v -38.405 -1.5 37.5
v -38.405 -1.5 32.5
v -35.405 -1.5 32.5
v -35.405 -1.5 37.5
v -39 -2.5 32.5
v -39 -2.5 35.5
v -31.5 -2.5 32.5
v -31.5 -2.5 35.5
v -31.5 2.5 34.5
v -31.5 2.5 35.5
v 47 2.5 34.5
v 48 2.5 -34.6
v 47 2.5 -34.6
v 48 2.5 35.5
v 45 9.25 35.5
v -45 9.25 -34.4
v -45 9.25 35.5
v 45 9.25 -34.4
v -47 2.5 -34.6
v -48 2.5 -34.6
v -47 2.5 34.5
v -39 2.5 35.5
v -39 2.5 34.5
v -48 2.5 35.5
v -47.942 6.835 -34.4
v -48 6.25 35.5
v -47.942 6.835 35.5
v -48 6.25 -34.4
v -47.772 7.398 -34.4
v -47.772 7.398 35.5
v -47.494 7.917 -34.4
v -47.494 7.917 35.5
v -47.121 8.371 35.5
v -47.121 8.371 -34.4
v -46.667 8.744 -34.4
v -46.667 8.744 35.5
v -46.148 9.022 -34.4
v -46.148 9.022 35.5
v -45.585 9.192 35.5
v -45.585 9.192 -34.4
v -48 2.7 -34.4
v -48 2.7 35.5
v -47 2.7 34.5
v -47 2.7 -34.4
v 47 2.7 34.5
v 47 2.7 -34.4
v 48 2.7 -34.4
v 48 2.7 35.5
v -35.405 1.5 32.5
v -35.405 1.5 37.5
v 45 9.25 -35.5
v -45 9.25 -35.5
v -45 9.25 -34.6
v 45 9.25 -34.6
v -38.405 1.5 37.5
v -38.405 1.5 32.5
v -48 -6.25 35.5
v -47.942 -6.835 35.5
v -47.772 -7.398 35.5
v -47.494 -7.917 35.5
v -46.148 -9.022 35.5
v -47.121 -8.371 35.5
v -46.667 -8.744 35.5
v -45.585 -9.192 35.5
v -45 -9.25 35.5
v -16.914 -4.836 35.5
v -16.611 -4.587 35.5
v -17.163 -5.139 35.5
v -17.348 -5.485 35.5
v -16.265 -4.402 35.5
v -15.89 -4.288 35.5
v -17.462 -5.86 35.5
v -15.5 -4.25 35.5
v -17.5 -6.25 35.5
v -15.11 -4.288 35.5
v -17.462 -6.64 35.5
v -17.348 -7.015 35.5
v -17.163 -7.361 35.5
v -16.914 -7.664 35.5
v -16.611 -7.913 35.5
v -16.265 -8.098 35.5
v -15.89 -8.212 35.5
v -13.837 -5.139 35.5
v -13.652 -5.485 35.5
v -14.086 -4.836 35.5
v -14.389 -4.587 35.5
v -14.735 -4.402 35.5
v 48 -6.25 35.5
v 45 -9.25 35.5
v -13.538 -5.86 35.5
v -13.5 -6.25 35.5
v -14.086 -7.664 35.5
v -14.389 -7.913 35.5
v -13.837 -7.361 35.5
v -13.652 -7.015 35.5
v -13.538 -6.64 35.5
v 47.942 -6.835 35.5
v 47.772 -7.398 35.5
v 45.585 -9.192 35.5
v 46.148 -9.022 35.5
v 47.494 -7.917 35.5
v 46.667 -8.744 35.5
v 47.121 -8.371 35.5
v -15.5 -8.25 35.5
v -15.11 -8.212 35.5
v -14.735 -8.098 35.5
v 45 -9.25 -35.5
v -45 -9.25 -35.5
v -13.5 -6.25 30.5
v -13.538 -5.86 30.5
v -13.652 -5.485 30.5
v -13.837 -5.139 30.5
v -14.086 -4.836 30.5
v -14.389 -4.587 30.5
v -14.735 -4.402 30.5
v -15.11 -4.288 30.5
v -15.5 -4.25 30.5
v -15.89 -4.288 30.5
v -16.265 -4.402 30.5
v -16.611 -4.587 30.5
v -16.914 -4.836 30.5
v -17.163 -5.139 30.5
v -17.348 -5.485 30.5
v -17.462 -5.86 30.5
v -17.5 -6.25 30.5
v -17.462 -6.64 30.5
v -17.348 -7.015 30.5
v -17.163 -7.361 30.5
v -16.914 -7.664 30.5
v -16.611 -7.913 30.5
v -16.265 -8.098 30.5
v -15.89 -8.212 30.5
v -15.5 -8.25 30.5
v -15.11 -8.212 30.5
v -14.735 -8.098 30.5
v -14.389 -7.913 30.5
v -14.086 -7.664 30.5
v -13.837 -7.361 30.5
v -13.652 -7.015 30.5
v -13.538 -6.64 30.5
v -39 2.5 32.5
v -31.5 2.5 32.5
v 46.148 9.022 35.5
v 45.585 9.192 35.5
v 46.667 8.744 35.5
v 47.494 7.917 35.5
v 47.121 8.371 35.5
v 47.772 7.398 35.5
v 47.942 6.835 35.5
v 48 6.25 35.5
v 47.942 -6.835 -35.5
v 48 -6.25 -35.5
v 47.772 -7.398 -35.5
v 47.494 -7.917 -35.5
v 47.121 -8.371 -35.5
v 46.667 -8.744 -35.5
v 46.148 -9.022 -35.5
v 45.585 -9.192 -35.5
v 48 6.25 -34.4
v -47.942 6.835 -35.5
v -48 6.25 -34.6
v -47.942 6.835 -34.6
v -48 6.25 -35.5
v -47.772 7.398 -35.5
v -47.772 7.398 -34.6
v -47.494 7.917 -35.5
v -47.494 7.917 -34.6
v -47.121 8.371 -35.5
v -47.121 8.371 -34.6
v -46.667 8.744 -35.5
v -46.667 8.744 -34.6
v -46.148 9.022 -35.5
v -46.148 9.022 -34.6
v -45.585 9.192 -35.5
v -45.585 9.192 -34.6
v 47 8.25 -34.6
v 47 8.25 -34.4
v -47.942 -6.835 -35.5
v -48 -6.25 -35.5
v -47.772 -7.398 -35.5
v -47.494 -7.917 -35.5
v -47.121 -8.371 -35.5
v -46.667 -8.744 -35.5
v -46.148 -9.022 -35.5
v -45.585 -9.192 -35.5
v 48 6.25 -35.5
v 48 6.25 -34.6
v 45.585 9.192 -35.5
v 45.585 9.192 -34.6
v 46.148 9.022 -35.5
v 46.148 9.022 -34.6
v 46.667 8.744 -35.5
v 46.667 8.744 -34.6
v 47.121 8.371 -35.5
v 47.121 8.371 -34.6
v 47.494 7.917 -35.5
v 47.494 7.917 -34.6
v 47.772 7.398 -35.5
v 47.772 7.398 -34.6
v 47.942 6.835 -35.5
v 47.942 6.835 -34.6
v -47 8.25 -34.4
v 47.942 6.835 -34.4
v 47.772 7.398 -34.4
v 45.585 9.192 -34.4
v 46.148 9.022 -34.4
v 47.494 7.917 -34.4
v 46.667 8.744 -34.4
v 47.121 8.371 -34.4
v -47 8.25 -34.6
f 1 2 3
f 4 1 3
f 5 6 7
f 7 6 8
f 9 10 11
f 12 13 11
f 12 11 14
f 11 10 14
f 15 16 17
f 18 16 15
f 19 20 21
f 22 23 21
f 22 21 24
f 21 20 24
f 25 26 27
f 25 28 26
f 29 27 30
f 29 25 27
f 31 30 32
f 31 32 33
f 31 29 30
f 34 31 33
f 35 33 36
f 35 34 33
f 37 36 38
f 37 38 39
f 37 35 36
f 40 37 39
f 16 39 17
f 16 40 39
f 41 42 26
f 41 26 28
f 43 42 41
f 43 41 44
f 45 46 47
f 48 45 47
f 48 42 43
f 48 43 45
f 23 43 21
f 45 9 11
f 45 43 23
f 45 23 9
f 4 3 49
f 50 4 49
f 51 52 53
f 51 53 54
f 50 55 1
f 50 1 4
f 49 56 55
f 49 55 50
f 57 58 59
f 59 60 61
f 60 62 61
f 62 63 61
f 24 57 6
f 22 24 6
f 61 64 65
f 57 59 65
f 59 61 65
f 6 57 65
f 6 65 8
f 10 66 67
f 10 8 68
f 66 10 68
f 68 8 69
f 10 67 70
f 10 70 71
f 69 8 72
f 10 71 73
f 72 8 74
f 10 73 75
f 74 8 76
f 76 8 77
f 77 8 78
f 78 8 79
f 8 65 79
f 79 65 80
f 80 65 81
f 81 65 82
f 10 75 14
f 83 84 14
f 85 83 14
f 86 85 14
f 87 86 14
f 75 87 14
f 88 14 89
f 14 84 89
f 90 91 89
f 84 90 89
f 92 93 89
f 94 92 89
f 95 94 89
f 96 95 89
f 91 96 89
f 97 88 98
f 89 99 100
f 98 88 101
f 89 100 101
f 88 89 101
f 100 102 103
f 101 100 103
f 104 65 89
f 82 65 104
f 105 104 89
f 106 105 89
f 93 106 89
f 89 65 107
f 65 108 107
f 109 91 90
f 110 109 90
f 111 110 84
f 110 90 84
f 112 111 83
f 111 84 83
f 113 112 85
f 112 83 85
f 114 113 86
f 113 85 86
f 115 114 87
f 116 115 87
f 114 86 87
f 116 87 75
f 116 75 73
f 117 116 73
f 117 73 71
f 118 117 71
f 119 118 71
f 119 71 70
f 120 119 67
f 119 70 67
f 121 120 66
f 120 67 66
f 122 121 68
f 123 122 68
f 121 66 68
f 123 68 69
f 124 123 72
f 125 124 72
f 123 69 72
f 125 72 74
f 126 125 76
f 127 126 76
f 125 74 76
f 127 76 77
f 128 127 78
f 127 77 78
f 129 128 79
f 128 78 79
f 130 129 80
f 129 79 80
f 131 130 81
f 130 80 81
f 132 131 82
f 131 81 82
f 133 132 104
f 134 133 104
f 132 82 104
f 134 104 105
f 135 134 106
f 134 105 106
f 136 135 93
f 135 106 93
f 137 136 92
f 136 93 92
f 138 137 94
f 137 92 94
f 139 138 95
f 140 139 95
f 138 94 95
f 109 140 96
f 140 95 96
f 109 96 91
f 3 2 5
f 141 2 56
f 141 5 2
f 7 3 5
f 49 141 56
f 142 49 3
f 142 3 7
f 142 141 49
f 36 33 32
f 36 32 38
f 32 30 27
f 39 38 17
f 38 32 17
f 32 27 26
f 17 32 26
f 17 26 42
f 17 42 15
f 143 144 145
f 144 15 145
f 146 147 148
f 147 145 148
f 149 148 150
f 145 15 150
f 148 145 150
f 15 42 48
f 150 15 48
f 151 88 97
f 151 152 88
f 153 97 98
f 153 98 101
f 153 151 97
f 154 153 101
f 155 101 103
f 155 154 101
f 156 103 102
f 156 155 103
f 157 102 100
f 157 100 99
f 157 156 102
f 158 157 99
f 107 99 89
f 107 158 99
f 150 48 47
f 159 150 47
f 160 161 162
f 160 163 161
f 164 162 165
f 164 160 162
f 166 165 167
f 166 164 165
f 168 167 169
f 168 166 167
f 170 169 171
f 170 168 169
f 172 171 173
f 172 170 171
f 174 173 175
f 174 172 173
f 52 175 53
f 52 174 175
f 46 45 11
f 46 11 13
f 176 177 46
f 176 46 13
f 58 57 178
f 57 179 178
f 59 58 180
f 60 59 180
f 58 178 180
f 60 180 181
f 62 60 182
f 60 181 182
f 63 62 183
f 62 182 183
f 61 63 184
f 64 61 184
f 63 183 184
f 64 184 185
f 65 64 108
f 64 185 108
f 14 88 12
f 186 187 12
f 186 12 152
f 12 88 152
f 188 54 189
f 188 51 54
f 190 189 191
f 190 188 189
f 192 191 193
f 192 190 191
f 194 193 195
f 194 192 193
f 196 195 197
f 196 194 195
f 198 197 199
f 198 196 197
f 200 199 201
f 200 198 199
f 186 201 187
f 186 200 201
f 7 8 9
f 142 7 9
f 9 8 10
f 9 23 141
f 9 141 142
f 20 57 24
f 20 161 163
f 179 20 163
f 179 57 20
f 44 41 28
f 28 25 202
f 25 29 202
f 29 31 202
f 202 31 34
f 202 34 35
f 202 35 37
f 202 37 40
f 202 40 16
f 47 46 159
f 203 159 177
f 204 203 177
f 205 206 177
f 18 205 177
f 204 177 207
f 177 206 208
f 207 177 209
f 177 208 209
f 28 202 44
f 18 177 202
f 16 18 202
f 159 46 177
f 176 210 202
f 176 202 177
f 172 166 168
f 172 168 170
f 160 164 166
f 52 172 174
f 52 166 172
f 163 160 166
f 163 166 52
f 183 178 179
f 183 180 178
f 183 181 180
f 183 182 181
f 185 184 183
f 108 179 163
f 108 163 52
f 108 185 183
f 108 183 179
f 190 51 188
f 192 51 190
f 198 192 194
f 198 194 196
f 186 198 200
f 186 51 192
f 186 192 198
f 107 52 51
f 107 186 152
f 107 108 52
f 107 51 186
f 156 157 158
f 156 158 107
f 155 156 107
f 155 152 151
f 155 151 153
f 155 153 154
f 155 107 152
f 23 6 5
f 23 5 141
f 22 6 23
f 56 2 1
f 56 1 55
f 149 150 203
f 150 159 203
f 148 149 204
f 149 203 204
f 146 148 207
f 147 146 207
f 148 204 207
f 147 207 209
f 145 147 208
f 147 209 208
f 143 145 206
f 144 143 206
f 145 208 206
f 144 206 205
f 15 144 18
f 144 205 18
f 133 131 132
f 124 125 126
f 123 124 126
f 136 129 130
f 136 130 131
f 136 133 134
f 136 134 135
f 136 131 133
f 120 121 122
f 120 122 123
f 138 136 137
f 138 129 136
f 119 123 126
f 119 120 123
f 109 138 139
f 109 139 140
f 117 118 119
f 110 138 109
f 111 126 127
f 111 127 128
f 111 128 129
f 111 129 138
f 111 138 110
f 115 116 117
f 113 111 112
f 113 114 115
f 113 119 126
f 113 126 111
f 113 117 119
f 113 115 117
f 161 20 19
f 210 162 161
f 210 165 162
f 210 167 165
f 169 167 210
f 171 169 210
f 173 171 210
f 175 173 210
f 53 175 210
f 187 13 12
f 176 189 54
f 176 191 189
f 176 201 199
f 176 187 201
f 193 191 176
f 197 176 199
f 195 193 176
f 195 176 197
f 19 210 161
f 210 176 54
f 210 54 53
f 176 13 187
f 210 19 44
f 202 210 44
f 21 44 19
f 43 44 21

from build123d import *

# Parameters (mm, degrees)
BOX_DEPTH                         = 9.25
BOX_DEPTH_BACK                    = 9.25
SKETCH1_W                         = 96
SKETCH1_H                         = 71
SKETCH2_W                         = 7.5
SKETCH2_H                         = 5
SWITCH_HOLE_DEPTH                 = 3
SKETCH4_W                         = 3
SKETCH4_H                         = 3
SWITCH_DEPTH                      = 5
SKETCH5_R                         = 2
WIRE_HOLE_DEPTH                   = 5
SKETCH7_W                         = 96
SKETCH7_H                         = 0.2
LID_INDICATOR_FRONT_DEPTH         = 1
SKETCH8_W                         = 70
SKETCH8_H                         = 0.2
LID_INDICATOR_LEFT_DEPTH          = 1
SKETCH9_W                         = 70
SKETCH9_H                         = 0.2
LID_INDICATOR_RIGHT_DEPTH         = 1
SKETCH10_W                        = 96
SKETCH10_H                        = 0.2
LID_INDICATOR_TOP_DEPTH           = 1
SKETCH11_W                        = 0.2
SKETCH11_H                        = 5.75
LID_INDICATOR_LEFT_SNIPPET_DEPTH  = 1
SKETCH12_W                        = 0.2
SKETCH12_H                        = 5.75
LID_INDICATOR_RIGHT_SNIPPET_DEPTH = 1
BOTTOM_ROUND_R                    = 3
TOP_ROUND_R                       = 3


with BuildPart() as part:
    # Sketch1 → Box (new, two sides: drawn at the far end of the back side and taken through both)
    with BuildSketch(Plane(origin=(0, 0, 0), x_dir=(1, 0, 0), z_dir=(0, 1, 0)).offset(-BOX_DEPTH_BACK)):
        Rectangle(SKETCH1_W, SKETCH1_H)
    extrude(amount=BOX_DEPTH + BOX_DEPTH_BACK)

    # Sketch2 → Switch Hole (cut)
    with BuildSketch(Plane.XY.offset(35.5)):
        with Locations((-35.25, 0)):
            Rectangle(SKETCH2_W, SKETCH2_H)
    extrude(amount=-SWITCH_HOLE_DEPTH, mode=Mode.SUBTRACT)

    # Sketch4 → Switch (add)
    with BuildSketch(Plane.XY.offset(32.5)):
        with Locations((-36.90464297, 0)):
            Rectangle(SKETCH4_W, SKETCH4_H)
    extrude(amount=SWITCH_DEPTH)

    # Sketch5 → Wire Hole (cut)
    with BuildSketch(Plane.XY.offset(35.5)):
        with Locations((-15.5, -6.25)):
            Circle(SKETCH5_R)
    extrude(amount=-WIRE_HOLE_DEPTH, mode=Mode.SUBTRACT)

    # Sketch7 → Lid Indicator Front (cut)
    with BuildSketch(Plane.XY.offset(35.5)):
        with Locations((0, 2.6)):
            Rectangle(SKETCH7_W, SKETCH7_H)
    extrude(amount=-LID_INDICATOR_FRONT_DEPTH, mode=Mode.SUBTRACT)

    # Sketch8 → Lid Indicator Left (cut)
    with BuildSketch(Plane.ZY.offset(48)):
        with Locations((0.5, 2.6)):
            Rectangle(SKETCH8_W, SKETCH8_H)
    extrude(amount=-LID_INDICATOR_LEFT_DEPTH, mode=Mode.SUBTRACT)

    # Sketch9 → Lid Indicator Right (cut)
    with BuildSketch(Plane(origin=(48, 0, 0), x_dir=(0, 0, -1), z_dir=(1, 0, 0))):
        with Locations((-0.5, 2.6)):
            Rectangle(SKETCH9_W, SKETCH9_H)
    extrude(amount=-LID_INDICATOR_RIGHT_DEPTH, mode=Mode.SUBTRACT)

    # Sketch10 → Lid Indicator Top (cut)
    with BuildSketch(Plane(origin=(0, 9.25, 0), x_dir=(1, 0, 0), z_dir=(0, 1, 0))):
        with Locations((0, 34.5)):
            Rectangle(SKETCH10_W, SKETCH10_H)
    extrude(amount=-LID_INDICATOR_TOP_DEPTH, mode=Mode.SUBTRACT)

    # Sketch11 → Lid Indicator Left Snippet (cut)
    with BuildSketch(Plane.ZY.offset(48)):
        with Locations((-34.5, 5.375)):
            Rectangle(SKETCH11_W, SKETCH11_H)
    extrude(amount=-LID_INDICATOR_LEFT_SNIPPET_DEPTH, mode=Mode.SUBTRACT)

    # Sketch12 → Lid Indicator Right Snippet (cut)
    with BuildSketch(Plane(origin=(48, 0, 0), x_dir=(0, 0, -1), z_dir=(1, 0, 0))):
        with Locations((34.5, 5.375)):
            Rectangle(SKETCH12_W, SKETCH12_H)
    extrude(amount=-LID_INDICATOR_RIGHT_SNIPPET_DEPTH, mode=Mode.SUBTRACT)

    # Bottom ROund
    bottom_round_edges = [part.edges().sort_by_distance(p)[0] for p in [
        (-48, -9.25, 0),
        (48, -9.25, 0),
    ]]
    fillet(bottom_round_edges, radius=BOTTOM_ROUND_R)

    # Top Round
    top_round_edges = [part.edges().sort_by_distance(p)[0] for p in [
        (48, 9.25, -35.05),
        (-48, 9.25, 0.55),
        (48, 9.25, 0.55),
        (-48, 9.25, -35.05),
    ]]
    fillet(top_round_edges, radius=TOP_ROUND_R)


solid = part.part
